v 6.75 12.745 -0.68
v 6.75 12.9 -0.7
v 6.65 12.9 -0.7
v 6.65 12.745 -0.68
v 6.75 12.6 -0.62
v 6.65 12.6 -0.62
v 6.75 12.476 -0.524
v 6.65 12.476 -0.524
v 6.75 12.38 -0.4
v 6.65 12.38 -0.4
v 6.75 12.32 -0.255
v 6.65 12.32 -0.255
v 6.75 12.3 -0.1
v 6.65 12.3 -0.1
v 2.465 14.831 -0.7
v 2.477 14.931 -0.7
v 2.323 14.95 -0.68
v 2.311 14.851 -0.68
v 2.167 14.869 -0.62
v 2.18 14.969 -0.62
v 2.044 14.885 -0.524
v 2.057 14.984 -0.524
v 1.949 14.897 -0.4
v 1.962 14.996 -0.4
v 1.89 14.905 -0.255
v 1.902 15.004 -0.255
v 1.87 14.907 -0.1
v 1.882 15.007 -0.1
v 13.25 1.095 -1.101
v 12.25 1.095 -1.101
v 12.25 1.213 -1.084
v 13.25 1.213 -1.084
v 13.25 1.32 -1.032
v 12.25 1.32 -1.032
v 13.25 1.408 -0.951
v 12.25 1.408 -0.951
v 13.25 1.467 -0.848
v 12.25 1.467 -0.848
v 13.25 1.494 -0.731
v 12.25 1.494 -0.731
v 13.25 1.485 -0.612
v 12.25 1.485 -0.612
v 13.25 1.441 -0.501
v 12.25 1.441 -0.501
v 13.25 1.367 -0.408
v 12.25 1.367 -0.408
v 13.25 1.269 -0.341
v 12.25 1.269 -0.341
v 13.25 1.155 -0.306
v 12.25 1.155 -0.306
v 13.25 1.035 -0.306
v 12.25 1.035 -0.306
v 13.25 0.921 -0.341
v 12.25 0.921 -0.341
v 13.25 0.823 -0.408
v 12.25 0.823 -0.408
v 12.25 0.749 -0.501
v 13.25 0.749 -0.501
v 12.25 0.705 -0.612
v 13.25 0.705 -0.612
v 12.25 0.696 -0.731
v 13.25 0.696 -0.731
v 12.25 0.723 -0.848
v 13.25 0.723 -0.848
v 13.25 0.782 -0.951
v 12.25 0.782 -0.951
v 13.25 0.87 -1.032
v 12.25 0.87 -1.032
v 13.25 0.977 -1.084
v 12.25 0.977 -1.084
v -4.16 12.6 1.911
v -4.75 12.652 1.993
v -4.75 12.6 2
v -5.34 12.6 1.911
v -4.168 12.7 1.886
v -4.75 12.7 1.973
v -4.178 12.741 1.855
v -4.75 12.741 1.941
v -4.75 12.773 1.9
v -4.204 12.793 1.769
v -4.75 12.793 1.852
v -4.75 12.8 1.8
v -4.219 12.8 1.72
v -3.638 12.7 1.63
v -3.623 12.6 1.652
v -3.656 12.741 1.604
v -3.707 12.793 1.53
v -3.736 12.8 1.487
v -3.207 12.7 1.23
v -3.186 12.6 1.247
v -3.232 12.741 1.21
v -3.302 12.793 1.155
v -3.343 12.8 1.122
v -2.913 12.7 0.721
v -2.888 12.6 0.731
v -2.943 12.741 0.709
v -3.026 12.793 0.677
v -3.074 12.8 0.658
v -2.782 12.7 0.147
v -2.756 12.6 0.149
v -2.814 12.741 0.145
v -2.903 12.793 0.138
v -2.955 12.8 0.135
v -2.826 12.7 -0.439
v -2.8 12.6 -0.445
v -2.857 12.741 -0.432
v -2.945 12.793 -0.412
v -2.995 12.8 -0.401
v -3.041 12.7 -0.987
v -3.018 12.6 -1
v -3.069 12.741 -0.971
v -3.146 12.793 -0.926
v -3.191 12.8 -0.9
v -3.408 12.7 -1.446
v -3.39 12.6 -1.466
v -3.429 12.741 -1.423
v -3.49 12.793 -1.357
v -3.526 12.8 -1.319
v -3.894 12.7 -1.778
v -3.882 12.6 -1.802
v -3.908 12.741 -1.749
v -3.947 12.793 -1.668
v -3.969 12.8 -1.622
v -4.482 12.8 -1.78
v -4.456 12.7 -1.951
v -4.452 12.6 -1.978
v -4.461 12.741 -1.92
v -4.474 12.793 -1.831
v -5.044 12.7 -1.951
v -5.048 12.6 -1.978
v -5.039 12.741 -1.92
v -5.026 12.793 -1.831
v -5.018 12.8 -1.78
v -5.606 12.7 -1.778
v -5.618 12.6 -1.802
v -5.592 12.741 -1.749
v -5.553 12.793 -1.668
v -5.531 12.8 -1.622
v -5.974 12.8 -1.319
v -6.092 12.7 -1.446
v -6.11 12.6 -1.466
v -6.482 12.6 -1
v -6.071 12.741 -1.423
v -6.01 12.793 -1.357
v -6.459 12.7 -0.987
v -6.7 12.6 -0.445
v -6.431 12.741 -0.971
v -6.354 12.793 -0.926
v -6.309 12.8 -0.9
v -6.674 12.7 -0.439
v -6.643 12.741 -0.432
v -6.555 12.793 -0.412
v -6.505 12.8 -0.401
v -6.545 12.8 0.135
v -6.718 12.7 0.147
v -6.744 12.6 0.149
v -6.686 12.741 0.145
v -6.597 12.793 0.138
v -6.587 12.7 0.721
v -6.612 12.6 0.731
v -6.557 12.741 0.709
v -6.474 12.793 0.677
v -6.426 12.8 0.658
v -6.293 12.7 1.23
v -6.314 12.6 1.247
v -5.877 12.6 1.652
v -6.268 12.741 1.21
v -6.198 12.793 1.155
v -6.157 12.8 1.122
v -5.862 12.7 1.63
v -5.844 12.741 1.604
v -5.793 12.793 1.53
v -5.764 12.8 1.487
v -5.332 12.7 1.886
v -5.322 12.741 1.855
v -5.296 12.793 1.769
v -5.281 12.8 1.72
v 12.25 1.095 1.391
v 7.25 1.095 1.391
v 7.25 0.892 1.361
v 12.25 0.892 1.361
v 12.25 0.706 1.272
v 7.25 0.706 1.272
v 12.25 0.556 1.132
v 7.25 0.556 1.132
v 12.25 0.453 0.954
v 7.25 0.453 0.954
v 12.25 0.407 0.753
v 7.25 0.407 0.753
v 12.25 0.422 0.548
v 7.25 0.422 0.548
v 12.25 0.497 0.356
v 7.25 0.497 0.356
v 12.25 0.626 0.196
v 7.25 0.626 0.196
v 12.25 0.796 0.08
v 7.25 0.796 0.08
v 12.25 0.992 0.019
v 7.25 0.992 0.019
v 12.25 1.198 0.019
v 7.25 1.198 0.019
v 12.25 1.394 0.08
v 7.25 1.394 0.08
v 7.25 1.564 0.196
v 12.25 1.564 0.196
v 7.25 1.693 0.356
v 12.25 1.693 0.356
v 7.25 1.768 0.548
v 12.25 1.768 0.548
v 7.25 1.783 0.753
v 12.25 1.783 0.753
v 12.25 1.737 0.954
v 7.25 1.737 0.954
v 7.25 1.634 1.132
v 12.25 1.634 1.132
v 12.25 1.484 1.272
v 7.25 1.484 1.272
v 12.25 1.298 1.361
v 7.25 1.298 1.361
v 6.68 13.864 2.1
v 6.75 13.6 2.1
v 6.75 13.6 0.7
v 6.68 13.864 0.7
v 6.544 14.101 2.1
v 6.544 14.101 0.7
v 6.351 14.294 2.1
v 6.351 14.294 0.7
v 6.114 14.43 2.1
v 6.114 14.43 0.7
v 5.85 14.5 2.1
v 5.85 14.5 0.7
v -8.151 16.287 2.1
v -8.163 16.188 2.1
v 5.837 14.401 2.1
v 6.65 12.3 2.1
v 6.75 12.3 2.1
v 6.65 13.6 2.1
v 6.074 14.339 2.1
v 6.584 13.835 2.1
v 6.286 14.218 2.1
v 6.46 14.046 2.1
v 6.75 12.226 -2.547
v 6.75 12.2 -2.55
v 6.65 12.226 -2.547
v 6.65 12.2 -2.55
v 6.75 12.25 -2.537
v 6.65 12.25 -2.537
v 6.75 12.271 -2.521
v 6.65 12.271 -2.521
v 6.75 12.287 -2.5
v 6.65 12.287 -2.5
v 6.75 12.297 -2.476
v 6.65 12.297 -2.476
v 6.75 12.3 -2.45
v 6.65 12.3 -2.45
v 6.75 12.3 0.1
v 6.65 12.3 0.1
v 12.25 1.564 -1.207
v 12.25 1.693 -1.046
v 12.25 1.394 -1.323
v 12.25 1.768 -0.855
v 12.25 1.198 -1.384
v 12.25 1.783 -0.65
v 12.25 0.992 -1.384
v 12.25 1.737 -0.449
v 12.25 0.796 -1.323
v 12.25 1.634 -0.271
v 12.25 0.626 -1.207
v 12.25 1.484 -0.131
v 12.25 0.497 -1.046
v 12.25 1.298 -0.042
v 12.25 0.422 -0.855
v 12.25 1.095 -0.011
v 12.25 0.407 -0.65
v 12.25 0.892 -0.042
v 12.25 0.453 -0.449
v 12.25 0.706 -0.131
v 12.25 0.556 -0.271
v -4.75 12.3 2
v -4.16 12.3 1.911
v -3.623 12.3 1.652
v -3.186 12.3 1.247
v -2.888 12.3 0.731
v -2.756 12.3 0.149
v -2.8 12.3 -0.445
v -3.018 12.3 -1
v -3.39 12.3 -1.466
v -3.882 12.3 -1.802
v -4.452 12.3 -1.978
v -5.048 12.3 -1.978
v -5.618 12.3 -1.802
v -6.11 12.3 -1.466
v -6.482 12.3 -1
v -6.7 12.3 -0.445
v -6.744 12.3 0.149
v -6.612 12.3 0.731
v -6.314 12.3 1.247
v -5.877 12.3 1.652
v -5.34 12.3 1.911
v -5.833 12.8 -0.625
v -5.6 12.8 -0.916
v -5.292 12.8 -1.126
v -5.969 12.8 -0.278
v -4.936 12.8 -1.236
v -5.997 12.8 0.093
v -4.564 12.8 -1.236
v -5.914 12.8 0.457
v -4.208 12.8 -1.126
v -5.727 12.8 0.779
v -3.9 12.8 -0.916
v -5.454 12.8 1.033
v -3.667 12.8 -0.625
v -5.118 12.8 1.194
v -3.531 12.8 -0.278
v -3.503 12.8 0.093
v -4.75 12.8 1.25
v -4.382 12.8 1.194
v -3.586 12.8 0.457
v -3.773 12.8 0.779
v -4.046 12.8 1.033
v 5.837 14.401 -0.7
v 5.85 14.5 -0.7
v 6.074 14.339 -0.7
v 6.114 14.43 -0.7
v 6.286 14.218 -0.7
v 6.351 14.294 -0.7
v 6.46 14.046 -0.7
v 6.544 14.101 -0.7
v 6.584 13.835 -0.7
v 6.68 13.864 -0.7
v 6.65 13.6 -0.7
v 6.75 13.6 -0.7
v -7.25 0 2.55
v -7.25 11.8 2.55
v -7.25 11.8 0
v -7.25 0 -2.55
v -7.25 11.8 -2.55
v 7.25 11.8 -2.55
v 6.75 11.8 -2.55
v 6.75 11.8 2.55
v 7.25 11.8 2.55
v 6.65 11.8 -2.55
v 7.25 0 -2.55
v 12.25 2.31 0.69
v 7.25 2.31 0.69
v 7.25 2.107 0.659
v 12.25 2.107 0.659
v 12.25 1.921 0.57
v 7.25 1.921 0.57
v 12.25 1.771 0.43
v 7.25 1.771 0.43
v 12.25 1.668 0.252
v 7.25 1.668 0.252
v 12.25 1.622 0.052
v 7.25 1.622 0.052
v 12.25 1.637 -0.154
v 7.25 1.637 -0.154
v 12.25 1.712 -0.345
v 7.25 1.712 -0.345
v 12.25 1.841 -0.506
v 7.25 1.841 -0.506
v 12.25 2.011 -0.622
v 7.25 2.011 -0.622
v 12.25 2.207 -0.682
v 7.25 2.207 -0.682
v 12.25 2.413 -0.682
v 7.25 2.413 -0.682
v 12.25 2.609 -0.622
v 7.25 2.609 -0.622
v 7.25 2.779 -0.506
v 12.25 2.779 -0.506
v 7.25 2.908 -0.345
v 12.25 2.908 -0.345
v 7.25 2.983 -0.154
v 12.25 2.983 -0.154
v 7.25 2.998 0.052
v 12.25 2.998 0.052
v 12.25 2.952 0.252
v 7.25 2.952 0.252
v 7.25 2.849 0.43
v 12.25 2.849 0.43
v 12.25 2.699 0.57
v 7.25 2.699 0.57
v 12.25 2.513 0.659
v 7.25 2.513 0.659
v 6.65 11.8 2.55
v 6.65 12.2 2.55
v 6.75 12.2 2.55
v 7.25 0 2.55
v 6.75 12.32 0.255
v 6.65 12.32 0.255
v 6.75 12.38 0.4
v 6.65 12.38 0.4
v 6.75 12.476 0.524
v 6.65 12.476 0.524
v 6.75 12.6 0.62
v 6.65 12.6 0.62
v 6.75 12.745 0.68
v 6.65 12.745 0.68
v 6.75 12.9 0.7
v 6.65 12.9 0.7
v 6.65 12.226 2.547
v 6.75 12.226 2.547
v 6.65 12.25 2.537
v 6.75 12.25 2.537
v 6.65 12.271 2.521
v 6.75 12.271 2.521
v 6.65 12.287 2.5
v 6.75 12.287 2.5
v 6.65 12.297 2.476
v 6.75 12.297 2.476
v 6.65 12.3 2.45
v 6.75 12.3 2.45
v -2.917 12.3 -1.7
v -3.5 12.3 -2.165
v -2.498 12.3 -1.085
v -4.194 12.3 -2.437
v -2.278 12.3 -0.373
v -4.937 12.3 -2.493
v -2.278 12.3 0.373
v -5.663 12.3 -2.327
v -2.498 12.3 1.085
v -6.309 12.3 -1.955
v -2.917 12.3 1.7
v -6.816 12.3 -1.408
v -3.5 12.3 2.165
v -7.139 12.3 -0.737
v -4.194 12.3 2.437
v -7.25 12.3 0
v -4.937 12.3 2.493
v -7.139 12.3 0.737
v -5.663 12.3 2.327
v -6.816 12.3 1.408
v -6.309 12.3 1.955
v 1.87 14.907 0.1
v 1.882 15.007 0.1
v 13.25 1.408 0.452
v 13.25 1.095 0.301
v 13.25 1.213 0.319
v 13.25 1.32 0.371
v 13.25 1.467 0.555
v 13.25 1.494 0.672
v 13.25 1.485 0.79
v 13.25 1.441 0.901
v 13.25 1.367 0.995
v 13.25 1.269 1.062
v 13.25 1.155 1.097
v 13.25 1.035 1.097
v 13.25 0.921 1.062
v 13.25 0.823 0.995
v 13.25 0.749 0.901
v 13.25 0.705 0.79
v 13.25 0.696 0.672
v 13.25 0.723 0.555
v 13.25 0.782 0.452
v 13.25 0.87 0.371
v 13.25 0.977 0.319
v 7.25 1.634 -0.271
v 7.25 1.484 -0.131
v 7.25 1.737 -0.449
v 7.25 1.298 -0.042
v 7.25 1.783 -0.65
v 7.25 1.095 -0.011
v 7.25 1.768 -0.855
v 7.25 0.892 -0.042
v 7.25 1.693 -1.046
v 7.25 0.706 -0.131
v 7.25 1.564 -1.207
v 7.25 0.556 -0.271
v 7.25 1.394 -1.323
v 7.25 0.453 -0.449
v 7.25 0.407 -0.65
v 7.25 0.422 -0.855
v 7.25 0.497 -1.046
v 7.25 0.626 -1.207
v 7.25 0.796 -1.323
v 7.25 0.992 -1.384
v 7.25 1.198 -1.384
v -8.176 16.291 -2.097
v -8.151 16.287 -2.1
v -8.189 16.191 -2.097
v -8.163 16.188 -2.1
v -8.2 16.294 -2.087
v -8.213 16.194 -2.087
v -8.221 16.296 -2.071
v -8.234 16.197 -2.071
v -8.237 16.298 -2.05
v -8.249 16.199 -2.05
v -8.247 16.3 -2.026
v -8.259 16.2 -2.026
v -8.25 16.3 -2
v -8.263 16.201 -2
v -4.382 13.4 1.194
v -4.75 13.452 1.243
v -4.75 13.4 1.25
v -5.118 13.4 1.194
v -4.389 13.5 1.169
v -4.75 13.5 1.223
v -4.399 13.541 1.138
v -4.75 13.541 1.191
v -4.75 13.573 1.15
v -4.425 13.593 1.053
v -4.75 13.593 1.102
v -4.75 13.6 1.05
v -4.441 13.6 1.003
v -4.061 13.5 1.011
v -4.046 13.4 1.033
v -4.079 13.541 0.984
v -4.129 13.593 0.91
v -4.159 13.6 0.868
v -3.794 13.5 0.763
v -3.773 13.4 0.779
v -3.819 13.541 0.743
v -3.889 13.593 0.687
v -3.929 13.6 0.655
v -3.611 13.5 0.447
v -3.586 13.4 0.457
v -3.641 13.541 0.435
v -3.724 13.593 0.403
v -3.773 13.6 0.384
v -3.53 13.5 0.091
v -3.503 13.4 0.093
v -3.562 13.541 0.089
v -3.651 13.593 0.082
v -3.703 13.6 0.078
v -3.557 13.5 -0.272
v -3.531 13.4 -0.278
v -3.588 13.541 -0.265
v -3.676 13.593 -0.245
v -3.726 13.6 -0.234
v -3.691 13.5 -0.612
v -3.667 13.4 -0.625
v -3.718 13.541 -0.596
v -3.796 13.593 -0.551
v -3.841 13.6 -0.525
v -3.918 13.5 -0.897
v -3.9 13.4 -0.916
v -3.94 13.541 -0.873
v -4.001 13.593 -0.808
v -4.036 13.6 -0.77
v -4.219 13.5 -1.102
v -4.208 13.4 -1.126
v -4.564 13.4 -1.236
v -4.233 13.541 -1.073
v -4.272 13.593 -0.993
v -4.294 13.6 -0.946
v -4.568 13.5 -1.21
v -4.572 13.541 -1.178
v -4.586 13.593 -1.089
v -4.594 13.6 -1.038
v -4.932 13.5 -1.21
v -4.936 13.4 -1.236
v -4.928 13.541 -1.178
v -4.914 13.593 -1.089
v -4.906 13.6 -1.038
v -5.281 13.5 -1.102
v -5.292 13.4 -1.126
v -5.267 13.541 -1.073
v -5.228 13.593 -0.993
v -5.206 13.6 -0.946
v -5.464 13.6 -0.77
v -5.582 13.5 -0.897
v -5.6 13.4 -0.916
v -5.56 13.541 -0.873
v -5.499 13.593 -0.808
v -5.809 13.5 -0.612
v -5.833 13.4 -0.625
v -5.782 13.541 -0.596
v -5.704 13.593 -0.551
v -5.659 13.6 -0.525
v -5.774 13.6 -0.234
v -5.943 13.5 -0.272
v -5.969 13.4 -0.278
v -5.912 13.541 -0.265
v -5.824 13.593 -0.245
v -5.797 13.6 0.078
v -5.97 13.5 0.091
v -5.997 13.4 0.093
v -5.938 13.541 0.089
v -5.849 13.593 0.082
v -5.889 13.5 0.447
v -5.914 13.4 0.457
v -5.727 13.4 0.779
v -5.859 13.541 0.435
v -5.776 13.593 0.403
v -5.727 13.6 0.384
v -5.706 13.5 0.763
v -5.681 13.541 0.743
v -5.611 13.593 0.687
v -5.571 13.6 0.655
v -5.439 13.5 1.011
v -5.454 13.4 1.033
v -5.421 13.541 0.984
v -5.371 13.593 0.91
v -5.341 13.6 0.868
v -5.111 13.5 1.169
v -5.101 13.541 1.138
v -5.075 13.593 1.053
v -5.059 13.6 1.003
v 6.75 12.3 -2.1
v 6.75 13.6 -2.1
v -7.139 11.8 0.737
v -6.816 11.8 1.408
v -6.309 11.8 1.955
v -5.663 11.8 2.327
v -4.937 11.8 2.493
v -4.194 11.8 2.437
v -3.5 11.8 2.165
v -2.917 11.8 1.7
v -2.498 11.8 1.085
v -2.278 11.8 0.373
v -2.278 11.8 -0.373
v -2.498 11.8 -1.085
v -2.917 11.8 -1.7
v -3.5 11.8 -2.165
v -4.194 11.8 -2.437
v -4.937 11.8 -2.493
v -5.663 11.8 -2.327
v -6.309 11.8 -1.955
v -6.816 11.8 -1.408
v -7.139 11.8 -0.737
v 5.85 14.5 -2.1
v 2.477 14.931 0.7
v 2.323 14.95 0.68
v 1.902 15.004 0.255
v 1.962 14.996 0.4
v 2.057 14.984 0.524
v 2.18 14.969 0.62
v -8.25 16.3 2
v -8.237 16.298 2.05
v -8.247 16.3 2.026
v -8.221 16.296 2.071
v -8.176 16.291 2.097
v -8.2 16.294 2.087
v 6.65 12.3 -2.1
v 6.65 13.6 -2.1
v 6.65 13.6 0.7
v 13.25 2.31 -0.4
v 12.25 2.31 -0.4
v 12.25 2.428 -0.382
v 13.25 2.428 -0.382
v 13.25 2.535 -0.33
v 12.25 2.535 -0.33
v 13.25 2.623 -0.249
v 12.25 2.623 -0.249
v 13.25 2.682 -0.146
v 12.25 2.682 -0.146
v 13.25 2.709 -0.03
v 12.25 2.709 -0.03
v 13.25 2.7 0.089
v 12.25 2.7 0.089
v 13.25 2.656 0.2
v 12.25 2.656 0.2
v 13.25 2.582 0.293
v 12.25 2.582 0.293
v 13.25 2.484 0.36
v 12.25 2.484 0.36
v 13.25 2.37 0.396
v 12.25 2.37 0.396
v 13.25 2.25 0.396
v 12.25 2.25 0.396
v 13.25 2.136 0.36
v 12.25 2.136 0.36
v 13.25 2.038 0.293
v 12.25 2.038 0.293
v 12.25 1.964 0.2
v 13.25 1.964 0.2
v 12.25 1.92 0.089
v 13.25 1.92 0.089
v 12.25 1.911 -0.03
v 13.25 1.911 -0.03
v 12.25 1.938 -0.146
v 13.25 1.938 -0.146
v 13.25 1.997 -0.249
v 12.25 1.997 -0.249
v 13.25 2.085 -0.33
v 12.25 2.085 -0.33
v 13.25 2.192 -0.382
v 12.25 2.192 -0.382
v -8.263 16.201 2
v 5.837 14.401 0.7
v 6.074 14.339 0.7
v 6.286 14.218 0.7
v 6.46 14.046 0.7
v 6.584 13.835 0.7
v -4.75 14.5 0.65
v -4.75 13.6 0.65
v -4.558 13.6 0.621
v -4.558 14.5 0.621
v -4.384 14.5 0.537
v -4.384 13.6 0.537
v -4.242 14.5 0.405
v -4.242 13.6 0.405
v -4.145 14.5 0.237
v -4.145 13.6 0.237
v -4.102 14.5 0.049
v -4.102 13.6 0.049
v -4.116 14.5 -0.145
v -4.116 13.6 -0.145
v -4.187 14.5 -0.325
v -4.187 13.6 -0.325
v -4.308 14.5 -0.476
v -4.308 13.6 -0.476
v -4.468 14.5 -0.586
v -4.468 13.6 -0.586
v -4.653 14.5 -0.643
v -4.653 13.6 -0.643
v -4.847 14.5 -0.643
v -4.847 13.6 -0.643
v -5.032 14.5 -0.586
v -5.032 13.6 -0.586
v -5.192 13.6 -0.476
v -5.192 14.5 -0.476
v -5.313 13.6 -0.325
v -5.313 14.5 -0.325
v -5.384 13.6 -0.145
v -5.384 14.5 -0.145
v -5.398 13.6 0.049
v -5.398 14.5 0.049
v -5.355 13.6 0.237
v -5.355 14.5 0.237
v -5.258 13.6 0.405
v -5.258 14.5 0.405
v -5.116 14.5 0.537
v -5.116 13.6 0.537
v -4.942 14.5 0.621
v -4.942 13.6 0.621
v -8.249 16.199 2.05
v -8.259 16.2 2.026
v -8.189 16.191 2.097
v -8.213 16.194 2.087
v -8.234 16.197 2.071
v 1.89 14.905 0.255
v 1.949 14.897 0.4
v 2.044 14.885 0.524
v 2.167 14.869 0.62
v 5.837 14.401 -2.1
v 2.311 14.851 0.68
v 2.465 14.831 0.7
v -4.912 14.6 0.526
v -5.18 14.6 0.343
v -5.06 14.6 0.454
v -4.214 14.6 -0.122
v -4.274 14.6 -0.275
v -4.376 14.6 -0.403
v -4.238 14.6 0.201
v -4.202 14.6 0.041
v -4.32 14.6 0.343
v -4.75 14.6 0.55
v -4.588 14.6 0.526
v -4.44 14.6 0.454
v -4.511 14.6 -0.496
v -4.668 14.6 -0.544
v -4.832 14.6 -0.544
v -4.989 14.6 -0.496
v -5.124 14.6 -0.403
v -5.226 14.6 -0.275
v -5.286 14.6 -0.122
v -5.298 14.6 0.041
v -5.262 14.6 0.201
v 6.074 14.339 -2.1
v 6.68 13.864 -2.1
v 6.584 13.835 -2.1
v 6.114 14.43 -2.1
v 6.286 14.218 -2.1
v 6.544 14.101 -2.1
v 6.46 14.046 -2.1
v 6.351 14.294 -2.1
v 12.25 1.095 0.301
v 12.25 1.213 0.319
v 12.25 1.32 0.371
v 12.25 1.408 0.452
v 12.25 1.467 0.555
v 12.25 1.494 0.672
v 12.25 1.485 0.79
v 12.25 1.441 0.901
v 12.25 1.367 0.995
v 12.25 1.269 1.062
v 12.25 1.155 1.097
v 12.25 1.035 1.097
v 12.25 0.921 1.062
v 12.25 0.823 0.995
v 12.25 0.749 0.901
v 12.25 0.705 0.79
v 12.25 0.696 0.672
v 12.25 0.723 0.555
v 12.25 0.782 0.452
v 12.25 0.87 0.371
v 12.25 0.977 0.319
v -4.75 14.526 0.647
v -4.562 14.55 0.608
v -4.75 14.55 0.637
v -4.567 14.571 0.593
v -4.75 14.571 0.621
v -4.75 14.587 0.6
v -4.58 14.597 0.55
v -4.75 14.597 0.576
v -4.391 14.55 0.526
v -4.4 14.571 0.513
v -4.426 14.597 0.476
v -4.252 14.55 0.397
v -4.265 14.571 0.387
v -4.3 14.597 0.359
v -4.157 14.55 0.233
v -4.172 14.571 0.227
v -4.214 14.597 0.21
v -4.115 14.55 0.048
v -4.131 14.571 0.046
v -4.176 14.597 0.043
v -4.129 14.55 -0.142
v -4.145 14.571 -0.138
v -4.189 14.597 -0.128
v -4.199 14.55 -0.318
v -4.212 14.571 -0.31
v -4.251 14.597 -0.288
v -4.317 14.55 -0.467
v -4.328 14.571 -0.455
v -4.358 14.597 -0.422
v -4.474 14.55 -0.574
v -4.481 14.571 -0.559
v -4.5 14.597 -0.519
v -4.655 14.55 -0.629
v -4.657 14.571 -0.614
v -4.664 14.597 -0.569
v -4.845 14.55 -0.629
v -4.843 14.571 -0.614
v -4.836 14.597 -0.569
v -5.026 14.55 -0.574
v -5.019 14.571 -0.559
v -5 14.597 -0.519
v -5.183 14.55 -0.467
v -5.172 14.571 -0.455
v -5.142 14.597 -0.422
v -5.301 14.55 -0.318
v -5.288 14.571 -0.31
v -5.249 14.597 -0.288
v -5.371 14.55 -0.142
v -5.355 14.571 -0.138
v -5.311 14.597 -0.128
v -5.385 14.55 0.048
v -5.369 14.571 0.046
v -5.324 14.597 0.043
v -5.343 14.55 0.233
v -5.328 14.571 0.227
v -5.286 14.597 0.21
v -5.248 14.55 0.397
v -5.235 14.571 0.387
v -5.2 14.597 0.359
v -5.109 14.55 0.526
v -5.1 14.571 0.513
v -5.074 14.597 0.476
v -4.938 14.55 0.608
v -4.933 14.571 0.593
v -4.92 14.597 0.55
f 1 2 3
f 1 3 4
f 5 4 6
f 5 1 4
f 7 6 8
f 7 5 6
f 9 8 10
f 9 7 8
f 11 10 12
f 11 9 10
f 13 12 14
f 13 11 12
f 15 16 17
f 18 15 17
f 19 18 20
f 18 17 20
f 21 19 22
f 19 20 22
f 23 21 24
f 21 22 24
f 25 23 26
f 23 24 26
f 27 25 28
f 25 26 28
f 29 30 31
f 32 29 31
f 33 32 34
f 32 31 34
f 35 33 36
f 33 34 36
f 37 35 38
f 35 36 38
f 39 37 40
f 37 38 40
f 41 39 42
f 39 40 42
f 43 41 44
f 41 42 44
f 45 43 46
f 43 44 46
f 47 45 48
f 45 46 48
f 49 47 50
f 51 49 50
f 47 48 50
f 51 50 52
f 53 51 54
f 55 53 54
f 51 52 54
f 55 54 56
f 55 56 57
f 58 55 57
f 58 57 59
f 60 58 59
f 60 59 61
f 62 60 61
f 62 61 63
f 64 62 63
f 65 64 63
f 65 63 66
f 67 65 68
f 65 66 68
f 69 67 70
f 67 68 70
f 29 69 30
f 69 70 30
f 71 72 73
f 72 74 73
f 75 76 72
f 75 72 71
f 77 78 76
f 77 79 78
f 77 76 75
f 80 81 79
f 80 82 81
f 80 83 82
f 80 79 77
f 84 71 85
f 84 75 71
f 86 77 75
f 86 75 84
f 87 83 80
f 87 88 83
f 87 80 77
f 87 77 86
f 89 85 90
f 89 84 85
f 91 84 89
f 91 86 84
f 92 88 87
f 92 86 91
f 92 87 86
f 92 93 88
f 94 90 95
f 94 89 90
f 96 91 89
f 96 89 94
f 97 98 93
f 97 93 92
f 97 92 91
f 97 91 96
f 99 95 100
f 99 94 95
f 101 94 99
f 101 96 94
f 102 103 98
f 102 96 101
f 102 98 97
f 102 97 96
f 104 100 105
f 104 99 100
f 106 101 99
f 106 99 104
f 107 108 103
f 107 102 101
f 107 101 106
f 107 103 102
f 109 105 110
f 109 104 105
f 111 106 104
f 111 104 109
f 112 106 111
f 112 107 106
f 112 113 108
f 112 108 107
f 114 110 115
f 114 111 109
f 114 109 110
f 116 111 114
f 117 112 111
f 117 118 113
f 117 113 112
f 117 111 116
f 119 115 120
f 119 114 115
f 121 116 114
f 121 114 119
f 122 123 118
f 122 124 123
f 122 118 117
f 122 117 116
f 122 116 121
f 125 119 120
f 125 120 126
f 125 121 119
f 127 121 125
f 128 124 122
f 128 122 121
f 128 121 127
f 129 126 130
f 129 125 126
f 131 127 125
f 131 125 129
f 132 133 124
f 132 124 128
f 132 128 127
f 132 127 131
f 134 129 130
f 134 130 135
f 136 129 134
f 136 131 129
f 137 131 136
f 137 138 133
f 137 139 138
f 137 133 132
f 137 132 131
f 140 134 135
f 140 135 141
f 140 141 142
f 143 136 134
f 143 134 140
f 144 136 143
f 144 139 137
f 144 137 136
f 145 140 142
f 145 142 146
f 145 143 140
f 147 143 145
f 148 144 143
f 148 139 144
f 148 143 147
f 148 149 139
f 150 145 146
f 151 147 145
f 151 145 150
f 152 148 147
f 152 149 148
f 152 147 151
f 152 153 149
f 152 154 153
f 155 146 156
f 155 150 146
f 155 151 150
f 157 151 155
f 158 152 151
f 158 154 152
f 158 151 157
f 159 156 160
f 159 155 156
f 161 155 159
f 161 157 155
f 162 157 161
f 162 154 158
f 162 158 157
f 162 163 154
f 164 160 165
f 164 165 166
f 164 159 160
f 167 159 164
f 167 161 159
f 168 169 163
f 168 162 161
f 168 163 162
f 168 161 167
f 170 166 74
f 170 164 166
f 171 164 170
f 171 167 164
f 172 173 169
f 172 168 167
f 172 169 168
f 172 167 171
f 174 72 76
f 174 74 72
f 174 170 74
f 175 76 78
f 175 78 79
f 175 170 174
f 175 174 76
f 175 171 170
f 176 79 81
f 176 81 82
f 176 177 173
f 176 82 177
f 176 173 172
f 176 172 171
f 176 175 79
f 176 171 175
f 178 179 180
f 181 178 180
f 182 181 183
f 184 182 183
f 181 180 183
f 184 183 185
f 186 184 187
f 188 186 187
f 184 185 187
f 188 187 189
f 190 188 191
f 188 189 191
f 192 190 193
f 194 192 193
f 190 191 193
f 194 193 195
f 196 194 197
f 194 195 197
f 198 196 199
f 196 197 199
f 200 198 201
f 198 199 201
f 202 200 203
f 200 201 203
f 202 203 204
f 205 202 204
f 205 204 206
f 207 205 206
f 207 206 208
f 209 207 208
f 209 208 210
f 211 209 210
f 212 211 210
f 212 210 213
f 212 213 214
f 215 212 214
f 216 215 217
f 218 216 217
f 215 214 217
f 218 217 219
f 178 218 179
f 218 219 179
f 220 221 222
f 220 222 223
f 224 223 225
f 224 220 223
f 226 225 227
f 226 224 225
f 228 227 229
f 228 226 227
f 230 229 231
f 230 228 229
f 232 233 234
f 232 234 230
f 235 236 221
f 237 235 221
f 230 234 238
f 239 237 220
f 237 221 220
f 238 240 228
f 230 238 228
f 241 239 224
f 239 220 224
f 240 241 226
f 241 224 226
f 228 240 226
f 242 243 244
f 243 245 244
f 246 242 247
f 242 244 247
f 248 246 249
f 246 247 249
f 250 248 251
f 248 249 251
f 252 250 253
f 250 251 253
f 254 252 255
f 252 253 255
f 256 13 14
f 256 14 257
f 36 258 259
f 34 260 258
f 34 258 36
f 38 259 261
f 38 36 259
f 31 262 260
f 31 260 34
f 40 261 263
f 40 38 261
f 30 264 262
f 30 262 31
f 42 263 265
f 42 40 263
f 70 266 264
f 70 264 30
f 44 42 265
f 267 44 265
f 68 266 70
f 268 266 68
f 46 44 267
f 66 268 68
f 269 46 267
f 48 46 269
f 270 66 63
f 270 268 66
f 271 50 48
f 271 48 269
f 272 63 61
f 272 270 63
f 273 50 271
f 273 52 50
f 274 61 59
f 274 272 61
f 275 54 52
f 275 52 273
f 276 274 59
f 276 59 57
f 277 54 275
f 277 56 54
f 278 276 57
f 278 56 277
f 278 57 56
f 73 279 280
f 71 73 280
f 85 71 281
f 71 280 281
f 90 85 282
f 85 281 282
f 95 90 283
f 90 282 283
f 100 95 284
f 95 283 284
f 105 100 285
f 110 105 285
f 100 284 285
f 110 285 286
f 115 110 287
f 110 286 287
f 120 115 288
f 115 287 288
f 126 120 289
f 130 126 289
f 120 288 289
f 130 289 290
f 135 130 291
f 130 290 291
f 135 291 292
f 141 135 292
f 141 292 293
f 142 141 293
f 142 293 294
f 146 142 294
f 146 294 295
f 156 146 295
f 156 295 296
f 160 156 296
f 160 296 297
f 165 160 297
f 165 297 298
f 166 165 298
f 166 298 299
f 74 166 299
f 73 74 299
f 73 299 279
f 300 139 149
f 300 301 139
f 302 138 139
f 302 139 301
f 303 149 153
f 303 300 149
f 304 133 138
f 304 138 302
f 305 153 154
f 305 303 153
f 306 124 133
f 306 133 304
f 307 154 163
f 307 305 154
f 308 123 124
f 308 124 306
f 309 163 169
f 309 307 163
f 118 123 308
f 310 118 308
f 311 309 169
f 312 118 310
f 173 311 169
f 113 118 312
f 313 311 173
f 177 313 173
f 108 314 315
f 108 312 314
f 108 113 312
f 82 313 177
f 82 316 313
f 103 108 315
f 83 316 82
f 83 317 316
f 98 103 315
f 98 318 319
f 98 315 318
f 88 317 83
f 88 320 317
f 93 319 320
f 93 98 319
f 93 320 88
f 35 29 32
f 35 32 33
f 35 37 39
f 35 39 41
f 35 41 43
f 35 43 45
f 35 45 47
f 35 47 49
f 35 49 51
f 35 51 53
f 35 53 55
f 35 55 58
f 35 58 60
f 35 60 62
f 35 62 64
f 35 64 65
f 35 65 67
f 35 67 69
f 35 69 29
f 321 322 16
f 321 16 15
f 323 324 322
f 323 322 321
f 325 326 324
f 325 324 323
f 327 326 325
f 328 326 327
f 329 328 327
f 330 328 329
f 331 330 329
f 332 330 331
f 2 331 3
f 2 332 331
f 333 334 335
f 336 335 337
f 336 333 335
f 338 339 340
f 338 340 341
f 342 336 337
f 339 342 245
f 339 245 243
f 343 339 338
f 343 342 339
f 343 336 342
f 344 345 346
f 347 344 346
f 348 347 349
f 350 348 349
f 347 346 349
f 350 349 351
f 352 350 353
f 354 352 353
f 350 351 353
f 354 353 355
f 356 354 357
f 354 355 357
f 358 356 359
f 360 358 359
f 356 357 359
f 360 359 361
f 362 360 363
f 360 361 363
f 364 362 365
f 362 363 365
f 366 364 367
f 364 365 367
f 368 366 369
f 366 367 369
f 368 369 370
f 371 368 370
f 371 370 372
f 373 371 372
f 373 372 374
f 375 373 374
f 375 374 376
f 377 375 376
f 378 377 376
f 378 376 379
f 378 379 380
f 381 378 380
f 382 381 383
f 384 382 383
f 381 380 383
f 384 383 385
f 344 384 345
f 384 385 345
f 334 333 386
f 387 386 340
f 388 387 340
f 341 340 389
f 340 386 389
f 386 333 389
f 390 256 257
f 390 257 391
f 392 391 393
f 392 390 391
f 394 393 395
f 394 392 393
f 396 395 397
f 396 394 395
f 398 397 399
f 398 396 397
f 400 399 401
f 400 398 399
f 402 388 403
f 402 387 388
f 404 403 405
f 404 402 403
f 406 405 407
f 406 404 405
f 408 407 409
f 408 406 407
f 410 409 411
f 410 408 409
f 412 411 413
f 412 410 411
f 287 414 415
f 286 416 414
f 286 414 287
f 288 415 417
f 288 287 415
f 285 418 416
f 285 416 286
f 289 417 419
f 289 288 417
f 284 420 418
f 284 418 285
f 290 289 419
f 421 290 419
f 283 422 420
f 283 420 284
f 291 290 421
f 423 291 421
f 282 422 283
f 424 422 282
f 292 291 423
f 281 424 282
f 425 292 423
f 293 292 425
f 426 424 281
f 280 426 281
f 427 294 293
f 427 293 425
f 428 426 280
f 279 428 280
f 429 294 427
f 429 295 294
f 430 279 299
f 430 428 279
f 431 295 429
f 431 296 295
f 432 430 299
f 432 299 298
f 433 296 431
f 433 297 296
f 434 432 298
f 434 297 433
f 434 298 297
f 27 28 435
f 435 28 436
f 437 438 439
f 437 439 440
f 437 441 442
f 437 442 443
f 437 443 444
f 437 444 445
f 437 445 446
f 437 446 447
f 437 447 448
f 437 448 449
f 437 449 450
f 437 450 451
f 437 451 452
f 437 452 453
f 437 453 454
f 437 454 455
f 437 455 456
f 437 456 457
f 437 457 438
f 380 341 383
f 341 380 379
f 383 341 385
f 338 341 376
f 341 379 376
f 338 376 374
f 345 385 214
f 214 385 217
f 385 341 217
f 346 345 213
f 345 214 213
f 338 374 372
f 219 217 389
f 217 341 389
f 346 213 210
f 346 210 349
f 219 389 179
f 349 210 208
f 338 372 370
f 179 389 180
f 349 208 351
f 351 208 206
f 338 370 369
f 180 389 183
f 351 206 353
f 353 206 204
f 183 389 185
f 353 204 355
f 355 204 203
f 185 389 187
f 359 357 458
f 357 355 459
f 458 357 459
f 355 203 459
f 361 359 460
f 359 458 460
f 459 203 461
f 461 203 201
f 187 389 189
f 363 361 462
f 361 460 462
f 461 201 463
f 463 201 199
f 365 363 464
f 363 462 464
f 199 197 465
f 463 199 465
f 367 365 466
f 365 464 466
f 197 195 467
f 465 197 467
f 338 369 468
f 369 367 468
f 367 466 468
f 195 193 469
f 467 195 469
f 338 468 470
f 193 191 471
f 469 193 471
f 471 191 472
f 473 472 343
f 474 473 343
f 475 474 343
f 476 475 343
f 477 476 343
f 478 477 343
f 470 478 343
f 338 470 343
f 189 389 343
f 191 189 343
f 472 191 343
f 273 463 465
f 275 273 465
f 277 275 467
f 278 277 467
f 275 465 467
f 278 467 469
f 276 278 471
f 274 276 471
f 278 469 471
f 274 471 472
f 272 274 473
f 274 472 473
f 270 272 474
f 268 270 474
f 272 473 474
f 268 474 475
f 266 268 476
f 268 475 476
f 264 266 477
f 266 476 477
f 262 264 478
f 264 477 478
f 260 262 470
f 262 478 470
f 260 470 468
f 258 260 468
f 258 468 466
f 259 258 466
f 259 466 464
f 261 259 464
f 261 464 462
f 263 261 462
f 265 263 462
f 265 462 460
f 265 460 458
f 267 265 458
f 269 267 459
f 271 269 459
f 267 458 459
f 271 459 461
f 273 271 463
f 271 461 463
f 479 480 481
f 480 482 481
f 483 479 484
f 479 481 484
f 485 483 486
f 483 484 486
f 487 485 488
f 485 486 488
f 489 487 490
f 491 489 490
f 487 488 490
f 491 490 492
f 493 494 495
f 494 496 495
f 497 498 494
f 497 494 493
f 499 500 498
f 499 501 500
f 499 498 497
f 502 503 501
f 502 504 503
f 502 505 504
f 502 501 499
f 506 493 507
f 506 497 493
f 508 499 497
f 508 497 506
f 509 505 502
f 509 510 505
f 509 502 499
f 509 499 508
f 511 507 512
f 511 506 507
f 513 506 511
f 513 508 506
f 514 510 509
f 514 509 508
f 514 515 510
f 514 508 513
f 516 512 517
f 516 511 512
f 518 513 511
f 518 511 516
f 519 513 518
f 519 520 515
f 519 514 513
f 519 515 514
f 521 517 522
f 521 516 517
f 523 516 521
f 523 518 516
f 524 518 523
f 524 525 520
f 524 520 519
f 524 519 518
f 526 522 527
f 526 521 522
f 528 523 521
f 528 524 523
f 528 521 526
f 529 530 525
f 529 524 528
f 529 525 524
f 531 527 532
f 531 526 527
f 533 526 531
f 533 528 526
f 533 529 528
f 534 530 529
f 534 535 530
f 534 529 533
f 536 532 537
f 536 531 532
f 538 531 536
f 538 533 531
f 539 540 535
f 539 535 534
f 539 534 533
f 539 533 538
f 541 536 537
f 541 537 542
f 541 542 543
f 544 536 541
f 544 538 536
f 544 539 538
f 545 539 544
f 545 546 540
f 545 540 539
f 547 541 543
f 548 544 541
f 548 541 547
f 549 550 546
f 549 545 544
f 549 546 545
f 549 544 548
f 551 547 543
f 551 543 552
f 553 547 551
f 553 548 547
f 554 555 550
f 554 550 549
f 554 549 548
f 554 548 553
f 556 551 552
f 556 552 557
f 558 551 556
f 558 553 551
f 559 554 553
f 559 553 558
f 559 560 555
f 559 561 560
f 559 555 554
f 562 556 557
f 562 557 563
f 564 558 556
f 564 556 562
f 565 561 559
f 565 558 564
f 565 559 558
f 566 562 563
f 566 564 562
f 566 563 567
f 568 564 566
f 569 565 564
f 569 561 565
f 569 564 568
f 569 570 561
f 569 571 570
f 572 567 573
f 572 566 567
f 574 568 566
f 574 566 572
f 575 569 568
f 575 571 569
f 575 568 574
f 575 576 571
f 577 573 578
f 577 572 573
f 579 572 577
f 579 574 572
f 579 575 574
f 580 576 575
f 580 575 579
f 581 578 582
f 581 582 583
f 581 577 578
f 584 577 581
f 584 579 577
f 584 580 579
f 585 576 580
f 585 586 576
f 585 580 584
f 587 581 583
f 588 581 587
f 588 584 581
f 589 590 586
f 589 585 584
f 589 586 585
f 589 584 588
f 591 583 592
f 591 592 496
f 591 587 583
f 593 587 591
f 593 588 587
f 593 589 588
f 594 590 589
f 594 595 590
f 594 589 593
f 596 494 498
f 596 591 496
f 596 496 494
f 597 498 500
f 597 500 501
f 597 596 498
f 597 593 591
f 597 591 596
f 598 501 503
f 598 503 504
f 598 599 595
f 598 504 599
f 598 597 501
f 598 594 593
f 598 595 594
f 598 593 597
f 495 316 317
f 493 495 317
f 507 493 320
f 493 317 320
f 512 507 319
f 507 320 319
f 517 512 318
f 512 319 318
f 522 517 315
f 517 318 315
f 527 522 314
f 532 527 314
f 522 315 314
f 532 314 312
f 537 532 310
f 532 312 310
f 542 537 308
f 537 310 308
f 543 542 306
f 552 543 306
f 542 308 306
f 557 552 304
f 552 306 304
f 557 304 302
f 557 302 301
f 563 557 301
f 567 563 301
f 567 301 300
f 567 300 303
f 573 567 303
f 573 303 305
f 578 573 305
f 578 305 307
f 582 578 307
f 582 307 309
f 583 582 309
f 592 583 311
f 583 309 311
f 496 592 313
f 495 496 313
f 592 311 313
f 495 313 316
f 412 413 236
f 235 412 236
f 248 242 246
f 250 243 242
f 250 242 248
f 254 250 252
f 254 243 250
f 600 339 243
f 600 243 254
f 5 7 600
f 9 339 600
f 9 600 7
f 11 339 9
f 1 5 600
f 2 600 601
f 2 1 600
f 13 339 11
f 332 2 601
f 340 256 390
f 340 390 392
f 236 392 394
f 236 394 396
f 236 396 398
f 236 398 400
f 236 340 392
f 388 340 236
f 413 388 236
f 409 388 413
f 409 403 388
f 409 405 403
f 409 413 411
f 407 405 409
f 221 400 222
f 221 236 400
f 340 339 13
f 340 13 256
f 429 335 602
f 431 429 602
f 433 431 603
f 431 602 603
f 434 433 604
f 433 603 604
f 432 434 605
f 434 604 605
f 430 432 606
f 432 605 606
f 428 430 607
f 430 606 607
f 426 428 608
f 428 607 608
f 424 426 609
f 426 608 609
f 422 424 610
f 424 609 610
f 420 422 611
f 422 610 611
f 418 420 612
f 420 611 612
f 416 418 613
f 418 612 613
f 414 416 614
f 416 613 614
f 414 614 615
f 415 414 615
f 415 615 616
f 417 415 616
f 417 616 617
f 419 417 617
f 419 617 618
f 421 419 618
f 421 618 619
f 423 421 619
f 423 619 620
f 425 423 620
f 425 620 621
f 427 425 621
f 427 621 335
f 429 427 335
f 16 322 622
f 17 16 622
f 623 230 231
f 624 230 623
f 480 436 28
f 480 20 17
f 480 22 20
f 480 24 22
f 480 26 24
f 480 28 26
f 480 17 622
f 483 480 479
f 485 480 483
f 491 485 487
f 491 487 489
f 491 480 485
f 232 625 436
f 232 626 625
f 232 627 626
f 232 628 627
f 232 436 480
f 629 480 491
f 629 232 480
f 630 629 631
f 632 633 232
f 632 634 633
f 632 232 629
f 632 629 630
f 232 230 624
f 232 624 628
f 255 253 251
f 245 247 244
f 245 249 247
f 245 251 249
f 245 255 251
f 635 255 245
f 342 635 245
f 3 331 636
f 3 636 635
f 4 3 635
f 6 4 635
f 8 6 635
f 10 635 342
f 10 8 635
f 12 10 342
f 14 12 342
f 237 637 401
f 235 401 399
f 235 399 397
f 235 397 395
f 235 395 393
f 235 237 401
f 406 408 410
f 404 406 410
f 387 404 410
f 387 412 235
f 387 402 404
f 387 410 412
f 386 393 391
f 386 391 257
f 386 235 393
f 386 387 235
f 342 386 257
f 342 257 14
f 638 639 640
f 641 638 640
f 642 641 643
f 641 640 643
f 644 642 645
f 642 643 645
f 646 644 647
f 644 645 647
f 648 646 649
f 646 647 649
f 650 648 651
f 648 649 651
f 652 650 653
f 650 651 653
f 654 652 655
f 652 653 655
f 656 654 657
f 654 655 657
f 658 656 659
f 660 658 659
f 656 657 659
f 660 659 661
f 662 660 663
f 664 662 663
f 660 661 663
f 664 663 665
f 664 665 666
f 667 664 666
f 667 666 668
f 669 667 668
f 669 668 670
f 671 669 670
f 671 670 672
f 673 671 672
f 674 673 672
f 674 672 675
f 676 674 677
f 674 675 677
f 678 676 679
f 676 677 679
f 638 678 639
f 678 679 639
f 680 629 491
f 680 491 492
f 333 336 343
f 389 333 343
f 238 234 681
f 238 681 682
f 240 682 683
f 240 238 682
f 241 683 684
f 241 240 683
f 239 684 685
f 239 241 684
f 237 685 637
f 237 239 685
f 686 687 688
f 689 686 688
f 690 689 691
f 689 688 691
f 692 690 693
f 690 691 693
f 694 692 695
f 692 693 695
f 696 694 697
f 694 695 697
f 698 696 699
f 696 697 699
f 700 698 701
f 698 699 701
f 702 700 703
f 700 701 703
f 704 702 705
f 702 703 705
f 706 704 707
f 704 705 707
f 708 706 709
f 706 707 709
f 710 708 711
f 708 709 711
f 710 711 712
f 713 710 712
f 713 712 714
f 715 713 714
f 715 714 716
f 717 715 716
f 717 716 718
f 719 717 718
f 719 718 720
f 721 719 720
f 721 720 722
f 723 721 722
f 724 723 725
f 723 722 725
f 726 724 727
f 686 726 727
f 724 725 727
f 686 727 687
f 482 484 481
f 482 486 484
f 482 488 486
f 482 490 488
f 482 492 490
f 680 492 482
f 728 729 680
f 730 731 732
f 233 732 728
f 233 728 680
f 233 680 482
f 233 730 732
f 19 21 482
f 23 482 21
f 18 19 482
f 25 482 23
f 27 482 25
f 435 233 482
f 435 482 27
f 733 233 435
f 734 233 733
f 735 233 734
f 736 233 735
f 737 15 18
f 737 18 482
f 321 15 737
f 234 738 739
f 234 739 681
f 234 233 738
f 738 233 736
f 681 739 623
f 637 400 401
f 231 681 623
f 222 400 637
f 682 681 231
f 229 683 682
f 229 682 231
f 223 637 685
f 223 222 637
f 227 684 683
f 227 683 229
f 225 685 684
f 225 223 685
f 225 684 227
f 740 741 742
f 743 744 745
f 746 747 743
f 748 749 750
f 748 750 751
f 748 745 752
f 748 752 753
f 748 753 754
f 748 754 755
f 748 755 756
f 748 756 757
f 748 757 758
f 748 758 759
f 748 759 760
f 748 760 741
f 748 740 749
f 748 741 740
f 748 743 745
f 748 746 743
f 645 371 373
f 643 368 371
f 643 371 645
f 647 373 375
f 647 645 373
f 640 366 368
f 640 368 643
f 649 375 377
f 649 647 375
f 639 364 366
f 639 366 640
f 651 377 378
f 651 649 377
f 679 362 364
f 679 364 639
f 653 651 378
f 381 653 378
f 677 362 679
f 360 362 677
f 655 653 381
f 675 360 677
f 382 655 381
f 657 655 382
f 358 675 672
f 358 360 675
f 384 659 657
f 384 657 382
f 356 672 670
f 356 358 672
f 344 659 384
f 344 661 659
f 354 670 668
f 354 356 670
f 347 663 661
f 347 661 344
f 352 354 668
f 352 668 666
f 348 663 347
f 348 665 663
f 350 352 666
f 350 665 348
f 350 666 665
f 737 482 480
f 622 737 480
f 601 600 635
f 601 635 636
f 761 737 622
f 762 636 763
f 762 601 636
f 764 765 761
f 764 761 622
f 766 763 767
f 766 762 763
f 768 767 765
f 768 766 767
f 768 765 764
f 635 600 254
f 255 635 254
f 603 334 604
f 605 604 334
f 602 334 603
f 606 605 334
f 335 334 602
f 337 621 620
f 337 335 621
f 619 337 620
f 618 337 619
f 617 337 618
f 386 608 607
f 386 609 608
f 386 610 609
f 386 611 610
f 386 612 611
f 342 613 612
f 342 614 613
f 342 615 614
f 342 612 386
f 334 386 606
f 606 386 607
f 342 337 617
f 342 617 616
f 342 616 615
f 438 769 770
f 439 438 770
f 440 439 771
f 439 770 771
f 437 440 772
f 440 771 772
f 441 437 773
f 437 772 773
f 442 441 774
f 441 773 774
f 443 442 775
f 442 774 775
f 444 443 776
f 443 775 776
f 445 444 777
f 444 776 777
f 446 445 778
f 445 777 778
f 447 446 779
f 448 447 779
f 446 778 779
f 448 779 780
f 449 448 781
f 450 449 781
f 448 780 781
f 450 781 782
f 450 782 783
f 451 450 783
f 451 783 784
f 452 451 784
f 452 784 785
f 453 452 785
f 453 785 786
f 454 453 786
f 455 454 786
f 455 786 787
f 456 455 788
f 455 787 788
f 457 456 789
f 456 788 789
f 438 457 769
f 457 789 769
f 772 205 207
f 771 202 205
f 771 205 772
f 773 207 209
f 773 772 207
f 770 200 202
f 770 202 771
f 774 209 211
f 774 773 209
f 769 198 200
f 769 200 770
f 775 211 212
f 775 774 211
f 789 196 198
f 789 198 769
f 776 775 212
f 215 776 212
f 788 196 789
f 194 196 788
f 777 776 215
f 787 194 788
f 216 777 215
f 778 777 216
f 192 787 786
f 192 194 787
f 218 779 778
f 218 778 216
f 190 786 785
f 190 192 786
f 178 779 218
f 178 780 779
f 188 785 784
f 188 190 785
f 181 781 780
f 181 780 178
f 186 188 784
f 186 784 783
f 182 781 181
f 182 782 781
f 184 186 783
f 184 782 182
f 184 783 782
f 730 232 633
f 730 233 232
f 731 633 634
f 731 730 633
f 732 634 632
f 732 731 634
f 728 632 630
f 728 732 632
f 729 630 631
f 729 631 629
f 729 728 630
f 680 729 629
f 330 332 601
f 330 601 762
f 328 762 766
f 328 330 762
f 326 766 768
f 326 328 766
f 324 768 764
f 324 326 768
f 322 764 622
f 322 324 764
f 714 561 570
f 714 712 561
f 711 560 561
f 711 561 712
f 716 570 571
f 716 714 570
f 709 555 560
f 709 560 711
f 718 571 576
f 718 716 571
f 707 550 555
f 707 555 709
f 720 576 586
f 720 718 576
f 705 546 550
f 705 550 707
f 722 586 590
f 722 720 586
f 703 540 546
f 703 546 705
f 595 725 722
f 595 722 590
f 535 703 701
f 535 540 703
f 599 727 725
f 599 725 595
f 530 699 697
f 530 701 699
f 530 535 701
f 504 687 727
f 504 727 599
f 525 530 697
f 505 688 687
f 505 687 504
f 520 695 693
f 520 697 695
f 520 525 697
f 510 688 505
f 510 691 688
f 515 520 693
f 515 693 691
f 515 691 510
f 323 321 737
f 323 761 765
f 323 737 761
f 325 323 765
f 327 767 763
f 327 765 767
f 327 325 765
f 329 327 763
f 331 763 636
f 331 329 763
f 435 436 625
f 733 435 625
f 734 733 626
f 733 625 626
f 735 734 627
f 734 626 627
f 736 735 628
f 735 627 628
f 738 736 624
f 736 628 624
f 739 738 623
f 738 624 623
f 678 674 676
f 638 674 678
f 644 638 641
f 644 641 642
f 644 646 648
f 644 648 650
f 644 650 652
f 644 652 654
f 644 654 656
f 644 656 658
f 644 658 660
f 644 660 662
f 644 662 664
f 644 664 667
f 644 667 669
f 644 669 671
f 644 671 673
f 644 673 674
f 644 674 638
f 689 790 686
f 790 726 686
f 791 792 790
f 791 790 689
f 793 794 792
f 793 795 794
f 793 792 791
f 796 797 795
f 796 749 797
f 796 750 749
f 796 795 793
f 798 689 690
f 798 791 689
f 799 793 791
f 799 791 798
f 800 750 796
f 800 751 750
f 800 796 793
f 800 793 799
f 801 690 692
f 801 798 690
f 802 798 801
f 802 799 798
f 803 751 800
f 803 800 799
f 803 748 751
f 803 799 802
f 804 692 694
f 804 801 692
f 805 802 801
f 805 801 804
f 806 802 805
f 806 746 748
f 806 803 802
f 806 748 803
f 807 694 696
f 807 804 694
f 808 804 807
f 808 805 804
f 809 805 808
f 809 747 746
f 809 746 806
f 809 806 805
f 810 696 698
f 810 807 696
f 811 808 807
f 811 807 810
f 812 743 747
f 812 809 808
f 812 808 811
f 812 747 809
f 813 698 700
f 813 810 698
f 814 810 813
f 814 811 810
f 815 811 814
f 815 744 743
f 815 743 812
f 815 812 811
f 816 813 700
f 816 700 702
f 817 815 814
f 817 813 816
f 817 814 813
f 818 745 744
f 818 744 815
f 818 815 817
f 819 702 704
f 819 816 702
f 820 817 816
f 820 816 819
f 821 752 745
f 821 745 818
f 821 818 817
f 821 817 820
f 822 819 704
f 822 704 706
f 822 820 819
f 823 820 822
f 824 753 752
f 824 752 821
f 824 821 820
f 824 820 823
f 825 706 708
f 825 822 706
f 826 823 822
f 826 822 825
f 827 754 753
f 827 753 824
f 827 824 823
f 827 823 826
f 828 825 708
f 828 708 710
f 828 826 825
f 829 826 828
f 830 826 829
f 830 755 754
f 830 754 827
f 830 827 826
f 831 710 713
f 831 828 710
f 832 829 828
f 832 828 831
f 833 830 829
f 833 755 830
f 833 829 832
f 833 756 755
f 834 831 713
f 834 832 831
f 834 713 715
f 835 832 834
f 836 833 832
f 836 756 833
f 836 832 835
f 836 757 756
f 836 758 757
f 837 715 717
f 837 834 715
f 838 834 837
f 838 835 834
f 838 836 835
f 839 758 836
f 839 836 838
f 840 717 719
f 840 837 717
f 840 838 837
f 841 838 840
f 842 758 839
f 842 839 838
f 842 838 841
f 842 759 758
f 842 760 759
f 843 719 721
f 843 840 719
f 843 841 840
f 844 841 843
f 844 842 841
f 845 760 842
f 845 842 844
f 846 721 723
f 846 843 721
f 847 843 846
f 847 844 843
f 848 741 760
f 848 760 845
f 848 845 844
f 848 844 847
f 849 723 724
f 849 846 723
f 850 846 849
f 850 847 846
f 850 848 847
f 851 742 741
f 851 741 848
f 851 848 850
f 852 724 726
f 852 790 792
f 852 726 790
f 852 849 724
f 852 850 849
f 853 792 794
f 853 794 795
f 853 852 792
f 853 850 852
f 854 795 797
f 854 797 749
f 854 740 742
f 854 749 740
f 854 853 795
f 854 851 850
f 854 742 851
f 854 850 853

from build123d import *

# Parameters (mm, degrees)
SZKIC2_W                    = 14.5
SZKIC2_H                    = 5.1
DODANIE_WYCI_GNI_CIE1_DEPTH = 11.8
SZKIC3_R                    = 2.5
SZKIC3_R_2                  = 2
DODANIE_WYCI_GNI_CIE2_DEPTH = 0.5
SZKIC4_R                    = 2
DODANIE_WYCI_GNI_CIE3_DEPTH = 1
SZKIC5_R                    = 1.25
DODANIE_WYCI_GNI_CIE4_DEPTH = 0.8
SZKIC6_R                    = 0.65
DODANIE_WYCI_GNI_CIE5_DEPTH = 1
ZAOKR_GLENIE1_R             = 0.2
DODANIE_WYCI_GNI_CIE7_DEPTH = 5.1
SZKIC11_W                   = 0.45
SZKIC11_H                   = 5.401514826
WYTNIJ_WYCI_GNI_CIE2_DEPTH  = 23.306334437
WYTNIJ_WYCI_GNI_CIE3_DEPTH  = 0.778786
WYTNIJ_WYCI_GNI_CIE4_DEPTH  = 5
ZAOKR_GLENIE2_R             = 0.1
SZKIC14_R                   = 0.69
DODANIE_WYCI_GNI_CIE8_DEPTH = 5
SZKIC15_R                   = 0.4
DODANIE_WYCI_GNI_CIE9_DEPTH = 1
ZAOKR_GLENIE3_R             = 0.1


with BuildPart() as part:
    # Szkic2 → Dodanie-wyciągnięcie1 (new body)
    with BuildSketch(Plane(origin=(0, 0, 0), x_dir=(1, 0, 0), z_dir=(0, 1, 0))):
        Rectangle(SZKIC2_W, SZKIC2_H)
    extrude(amount=DODANIE_WYCI_GNI_CIE1_DEPTH)

    # Szkic3 → Dodanie-wyciągnięcie2 (add)
    with BuildSketch(Plane(origin=(0, 11.8, 0), x_dir=(1, 0, 0), z_dir=(0, 1, 0))):
        with Locations(Location((-4.75, 0, 0), (0, 0, 180))):
            Circle(SZKIC3_R)
        with Locations(Location((-4.75, 0, 0), (0, 0, 270))):
            Circle(SZKIC3_R_2, mode=Mode.SUBTRACT)
    extrude(amount=DODANIE_WYCI_GNI_CIE2_DEPTH)

    # Szkic4 → Dodanie-wyciągnięcie3 (add)
    with BuildSketch(Plane(origin=(0, 11.8, 0), x_dir=(1, 0, 0), z_dir=(0, 1, 0))):
        with Locations(Location((-4.75, 0, 0), (0, 0, 270))):
            Circle(SZKIC4_R)
    extrude(amount=DODANIE_WYCI_GNI_CIE3_DEPTH)

    # Szkic5 → Dodanie-wyciągnięcie4 (add)
    with BuildSketch(Plane(origin=(0, 12.8, 0), x_dir=(1, 0, 0), z_dir=(0, 1, 0))):
        with Locations(Location((-4.75, 0, 0), (0, 0, 270))):
            Circle(SZKIC5_R)
    extrude(amount=DODANIE_WYCI_GNI_CIE4_DEPTH)

    # Szkic6 → Dodanie-wyciągnięcie5 (add)
    with BuildSketch(Plane(origin=(0, 13.6, 0), x_dir=(1, 0, 0), z_dir=(0, 1, 0))):
        with Locations(Location((-4.75, 0, 0), (0, 0, 270))):
            Circle(SZKIC6_R)
    extrude(amount=DODANIE_WYCI_GNI_CIE5_DEPTH)

    # Zaokrąglenie1
    zaokr_glenie1_edges = [part.edges().sort_by_distance(p)[0] for p in [
        (-4.75, 12.8, -2),
        (-4.75, 13.6, -1.25),
    ]]
    fillet(zaokr_glenie1_edges, radius=ZAOKR_GLENIE1_R)

    # Szkic10 → Dodanie-wyciągnięcie7 (add)
    with BuildSketch(Plane.XY.offset(2.55)):
        with BuildLine():
            Line((6.75, 11.8), (6.75, 13.6))
            ThreePointArc((6.75, 13.6), (6.45374044, 14.20374044), (5.85, 14.5))
            Line((5.85, 14.5), (-8.25, 16.3))
            Line((-8.25, 16.3), (-8.262663189, 16.200805022))
            Line((-8.262663189, 16.200805022), (5.837336811, 14.400805022))
            ThreePointArc((5.837336811, 14.400805022), (6.378823054, 14.137558504), (6.65, 13.6))
            Line((6.65, 13.6), (6.65, 11.8))
            Line((6.65, 11.8), (6.75, 11.8))
        make_face()
    extrude(amount=-DODANIE_WYCI_GNI_CIE7_DEPTH)

    # Szkic11 → Wytnij-wyciągnięcie2 (cut, through all)
    with BuildSketch(Plane(origin=(6.75, 0, 0), x_dir=(0, 0, -1), z_dir=(1, 0, 0))):
        with Locations((-2.325, 15.000757413)):
            Rectangle(SZKIC11_W, SZKIC11_H)
        with Locations((2.325, 15.000757413)):
            Rectangle(SZKIC11_W, SZKIC11_H)
    extrude(amount=-WYTNIJ_WYCI_GNI_CIE2_DEPTH, mode=Mode.SUBTRACT)

    # Szkic12 → Wytnij-wyciągnięcie3 (cut)
    with BuildSketch(Plane(origin=(1.91518931, 15.002316258, 0), x_dir=(0.9919497796038491, -0.12663188675793827, 0), z_dir=(0.12663188675793827, 0.9919497796038491, 0))):
        with BuildLine():
            Line((-0.033256147, 0.1), (-0.033256147, -0.1))
            ThreePointArc((-0.033256147, -0.1), (0.142479784, -0.524264069), (0.566743853, -0.7))
            Line((0.566743853, -0.7), (3.966743853, -0.7))
            Line((3.966743853, -0.7), (8.34703338, -0.7))
            Line((8.34703338, -0.7), (8.34703338, 0.7))
            Line((8.34703338, 0.7), (3.966743853, 0.7))
            Line((3.966743853, 0.7), (0.566743853, 0.7))
            ThreePointArc((0.566743853, 0.7), (0.142479784, 0.524264069), (-0.033256147, 0.1))
        make_face()
    extrude(amount=-WYTNIJ_WYCI_GNI_CIE3_DEPTH, mode=Mode.SUBTRACT)

    # Szkic13 → Wytnij-wyciągnięcie4 (cut)
    with BuildSketch(Plane(origin=(6.75, 0, 0), x_dir=(0, 0, -1), z_dir=(1, 0, 0))):
        with BuildLine():
            Line((0.1, 12.3), (-0.1, 12.3))
            ThreePointArc((-0.1, 12.3), (-0.524264069, 12.475735931), (-0.7, 12.9))
            Line((-0.7, 12.9), (-0.7, 14.054695175))
            Line((-0.7, 14.054695175), (0.7, 14.054695175))
            Line((0.7, 14.054695175), (0.7, 12.9))
            ThreePointArc((0.7, 12.9), (0.524264069, 12.475735931), (0.1, 12.3))
        make_face()
    extrude(amount=-WYTNIJ_WYCI_GNI_CIE4_DEPTH, mode=Mode.SUBTRACT)

    # Zaokrąglenie2
    zaokr_glenie2_edges = [part.edges().sort_by_distance(p)[0] for p in [
        (-4.75, 14.6, -0.65),
    ]]
    fillet(zaokr_glenie2_edges, radius=ZAOKR_GLENIE2_R)

    # Szkic14 → Dodanie-wyciągnięcie8 (add)
    with BuildSketch(Plane(origin=(7.25, 0, 0), x_dir=(0, 0, -1), z_dir=(1, 0, 0))):
        with Locations(Location((0, 2.31, 0), (0, 0, 180))):
            Circle(SZKIC14_R)
        with Locations(Location((0.701480577, 1.095, 0), (0, 0, 180))):
            Circle(SZKIC14_R)
        with Locations(Location((-0.701480577, 1.095, 0), (0, 0, 180))):
            Circle(SZKIC14_R)
    extrude(amount=DODANIE_WYCI_GNI_CIE8_DEPTH)

    # Szkic15 → Dodanie-wyciągnięcie9 (add)
    with BuildSketch(Plane(origin=(12.25, 0, 0), x_dir=(0, 0, -1), z_dir=(1, 0, 0))):
        with Locations((0, 2.31)):
            Circle(SZKIC15_R)
        with Locations((0.701480577, 1.095)):
            Circle(SZKIC15_R)
        with Locations((-0.701480577, 1.095)):
            Circle(SZKIC15_R)
    extrude(amount=DODANIE_WYCI_GNI_CIE9_DEPTH)

    # Zaokrąglenie3
    zaokr_glenie3_edges = [part.edges().sort_by_distance(p)[0] for p in [
        (-8.256331594, 16.250402511, -2.1),
        (6.7, 12.3, -2.55),
        (-8.256331594, 16.250402511, 2.1),
        (6.7, 12.3, 2.55),
    ]]
    fillet(zaokr_glenie3_edges, radius=ZAOKR_GLENIE3_R)


solid = part.part
